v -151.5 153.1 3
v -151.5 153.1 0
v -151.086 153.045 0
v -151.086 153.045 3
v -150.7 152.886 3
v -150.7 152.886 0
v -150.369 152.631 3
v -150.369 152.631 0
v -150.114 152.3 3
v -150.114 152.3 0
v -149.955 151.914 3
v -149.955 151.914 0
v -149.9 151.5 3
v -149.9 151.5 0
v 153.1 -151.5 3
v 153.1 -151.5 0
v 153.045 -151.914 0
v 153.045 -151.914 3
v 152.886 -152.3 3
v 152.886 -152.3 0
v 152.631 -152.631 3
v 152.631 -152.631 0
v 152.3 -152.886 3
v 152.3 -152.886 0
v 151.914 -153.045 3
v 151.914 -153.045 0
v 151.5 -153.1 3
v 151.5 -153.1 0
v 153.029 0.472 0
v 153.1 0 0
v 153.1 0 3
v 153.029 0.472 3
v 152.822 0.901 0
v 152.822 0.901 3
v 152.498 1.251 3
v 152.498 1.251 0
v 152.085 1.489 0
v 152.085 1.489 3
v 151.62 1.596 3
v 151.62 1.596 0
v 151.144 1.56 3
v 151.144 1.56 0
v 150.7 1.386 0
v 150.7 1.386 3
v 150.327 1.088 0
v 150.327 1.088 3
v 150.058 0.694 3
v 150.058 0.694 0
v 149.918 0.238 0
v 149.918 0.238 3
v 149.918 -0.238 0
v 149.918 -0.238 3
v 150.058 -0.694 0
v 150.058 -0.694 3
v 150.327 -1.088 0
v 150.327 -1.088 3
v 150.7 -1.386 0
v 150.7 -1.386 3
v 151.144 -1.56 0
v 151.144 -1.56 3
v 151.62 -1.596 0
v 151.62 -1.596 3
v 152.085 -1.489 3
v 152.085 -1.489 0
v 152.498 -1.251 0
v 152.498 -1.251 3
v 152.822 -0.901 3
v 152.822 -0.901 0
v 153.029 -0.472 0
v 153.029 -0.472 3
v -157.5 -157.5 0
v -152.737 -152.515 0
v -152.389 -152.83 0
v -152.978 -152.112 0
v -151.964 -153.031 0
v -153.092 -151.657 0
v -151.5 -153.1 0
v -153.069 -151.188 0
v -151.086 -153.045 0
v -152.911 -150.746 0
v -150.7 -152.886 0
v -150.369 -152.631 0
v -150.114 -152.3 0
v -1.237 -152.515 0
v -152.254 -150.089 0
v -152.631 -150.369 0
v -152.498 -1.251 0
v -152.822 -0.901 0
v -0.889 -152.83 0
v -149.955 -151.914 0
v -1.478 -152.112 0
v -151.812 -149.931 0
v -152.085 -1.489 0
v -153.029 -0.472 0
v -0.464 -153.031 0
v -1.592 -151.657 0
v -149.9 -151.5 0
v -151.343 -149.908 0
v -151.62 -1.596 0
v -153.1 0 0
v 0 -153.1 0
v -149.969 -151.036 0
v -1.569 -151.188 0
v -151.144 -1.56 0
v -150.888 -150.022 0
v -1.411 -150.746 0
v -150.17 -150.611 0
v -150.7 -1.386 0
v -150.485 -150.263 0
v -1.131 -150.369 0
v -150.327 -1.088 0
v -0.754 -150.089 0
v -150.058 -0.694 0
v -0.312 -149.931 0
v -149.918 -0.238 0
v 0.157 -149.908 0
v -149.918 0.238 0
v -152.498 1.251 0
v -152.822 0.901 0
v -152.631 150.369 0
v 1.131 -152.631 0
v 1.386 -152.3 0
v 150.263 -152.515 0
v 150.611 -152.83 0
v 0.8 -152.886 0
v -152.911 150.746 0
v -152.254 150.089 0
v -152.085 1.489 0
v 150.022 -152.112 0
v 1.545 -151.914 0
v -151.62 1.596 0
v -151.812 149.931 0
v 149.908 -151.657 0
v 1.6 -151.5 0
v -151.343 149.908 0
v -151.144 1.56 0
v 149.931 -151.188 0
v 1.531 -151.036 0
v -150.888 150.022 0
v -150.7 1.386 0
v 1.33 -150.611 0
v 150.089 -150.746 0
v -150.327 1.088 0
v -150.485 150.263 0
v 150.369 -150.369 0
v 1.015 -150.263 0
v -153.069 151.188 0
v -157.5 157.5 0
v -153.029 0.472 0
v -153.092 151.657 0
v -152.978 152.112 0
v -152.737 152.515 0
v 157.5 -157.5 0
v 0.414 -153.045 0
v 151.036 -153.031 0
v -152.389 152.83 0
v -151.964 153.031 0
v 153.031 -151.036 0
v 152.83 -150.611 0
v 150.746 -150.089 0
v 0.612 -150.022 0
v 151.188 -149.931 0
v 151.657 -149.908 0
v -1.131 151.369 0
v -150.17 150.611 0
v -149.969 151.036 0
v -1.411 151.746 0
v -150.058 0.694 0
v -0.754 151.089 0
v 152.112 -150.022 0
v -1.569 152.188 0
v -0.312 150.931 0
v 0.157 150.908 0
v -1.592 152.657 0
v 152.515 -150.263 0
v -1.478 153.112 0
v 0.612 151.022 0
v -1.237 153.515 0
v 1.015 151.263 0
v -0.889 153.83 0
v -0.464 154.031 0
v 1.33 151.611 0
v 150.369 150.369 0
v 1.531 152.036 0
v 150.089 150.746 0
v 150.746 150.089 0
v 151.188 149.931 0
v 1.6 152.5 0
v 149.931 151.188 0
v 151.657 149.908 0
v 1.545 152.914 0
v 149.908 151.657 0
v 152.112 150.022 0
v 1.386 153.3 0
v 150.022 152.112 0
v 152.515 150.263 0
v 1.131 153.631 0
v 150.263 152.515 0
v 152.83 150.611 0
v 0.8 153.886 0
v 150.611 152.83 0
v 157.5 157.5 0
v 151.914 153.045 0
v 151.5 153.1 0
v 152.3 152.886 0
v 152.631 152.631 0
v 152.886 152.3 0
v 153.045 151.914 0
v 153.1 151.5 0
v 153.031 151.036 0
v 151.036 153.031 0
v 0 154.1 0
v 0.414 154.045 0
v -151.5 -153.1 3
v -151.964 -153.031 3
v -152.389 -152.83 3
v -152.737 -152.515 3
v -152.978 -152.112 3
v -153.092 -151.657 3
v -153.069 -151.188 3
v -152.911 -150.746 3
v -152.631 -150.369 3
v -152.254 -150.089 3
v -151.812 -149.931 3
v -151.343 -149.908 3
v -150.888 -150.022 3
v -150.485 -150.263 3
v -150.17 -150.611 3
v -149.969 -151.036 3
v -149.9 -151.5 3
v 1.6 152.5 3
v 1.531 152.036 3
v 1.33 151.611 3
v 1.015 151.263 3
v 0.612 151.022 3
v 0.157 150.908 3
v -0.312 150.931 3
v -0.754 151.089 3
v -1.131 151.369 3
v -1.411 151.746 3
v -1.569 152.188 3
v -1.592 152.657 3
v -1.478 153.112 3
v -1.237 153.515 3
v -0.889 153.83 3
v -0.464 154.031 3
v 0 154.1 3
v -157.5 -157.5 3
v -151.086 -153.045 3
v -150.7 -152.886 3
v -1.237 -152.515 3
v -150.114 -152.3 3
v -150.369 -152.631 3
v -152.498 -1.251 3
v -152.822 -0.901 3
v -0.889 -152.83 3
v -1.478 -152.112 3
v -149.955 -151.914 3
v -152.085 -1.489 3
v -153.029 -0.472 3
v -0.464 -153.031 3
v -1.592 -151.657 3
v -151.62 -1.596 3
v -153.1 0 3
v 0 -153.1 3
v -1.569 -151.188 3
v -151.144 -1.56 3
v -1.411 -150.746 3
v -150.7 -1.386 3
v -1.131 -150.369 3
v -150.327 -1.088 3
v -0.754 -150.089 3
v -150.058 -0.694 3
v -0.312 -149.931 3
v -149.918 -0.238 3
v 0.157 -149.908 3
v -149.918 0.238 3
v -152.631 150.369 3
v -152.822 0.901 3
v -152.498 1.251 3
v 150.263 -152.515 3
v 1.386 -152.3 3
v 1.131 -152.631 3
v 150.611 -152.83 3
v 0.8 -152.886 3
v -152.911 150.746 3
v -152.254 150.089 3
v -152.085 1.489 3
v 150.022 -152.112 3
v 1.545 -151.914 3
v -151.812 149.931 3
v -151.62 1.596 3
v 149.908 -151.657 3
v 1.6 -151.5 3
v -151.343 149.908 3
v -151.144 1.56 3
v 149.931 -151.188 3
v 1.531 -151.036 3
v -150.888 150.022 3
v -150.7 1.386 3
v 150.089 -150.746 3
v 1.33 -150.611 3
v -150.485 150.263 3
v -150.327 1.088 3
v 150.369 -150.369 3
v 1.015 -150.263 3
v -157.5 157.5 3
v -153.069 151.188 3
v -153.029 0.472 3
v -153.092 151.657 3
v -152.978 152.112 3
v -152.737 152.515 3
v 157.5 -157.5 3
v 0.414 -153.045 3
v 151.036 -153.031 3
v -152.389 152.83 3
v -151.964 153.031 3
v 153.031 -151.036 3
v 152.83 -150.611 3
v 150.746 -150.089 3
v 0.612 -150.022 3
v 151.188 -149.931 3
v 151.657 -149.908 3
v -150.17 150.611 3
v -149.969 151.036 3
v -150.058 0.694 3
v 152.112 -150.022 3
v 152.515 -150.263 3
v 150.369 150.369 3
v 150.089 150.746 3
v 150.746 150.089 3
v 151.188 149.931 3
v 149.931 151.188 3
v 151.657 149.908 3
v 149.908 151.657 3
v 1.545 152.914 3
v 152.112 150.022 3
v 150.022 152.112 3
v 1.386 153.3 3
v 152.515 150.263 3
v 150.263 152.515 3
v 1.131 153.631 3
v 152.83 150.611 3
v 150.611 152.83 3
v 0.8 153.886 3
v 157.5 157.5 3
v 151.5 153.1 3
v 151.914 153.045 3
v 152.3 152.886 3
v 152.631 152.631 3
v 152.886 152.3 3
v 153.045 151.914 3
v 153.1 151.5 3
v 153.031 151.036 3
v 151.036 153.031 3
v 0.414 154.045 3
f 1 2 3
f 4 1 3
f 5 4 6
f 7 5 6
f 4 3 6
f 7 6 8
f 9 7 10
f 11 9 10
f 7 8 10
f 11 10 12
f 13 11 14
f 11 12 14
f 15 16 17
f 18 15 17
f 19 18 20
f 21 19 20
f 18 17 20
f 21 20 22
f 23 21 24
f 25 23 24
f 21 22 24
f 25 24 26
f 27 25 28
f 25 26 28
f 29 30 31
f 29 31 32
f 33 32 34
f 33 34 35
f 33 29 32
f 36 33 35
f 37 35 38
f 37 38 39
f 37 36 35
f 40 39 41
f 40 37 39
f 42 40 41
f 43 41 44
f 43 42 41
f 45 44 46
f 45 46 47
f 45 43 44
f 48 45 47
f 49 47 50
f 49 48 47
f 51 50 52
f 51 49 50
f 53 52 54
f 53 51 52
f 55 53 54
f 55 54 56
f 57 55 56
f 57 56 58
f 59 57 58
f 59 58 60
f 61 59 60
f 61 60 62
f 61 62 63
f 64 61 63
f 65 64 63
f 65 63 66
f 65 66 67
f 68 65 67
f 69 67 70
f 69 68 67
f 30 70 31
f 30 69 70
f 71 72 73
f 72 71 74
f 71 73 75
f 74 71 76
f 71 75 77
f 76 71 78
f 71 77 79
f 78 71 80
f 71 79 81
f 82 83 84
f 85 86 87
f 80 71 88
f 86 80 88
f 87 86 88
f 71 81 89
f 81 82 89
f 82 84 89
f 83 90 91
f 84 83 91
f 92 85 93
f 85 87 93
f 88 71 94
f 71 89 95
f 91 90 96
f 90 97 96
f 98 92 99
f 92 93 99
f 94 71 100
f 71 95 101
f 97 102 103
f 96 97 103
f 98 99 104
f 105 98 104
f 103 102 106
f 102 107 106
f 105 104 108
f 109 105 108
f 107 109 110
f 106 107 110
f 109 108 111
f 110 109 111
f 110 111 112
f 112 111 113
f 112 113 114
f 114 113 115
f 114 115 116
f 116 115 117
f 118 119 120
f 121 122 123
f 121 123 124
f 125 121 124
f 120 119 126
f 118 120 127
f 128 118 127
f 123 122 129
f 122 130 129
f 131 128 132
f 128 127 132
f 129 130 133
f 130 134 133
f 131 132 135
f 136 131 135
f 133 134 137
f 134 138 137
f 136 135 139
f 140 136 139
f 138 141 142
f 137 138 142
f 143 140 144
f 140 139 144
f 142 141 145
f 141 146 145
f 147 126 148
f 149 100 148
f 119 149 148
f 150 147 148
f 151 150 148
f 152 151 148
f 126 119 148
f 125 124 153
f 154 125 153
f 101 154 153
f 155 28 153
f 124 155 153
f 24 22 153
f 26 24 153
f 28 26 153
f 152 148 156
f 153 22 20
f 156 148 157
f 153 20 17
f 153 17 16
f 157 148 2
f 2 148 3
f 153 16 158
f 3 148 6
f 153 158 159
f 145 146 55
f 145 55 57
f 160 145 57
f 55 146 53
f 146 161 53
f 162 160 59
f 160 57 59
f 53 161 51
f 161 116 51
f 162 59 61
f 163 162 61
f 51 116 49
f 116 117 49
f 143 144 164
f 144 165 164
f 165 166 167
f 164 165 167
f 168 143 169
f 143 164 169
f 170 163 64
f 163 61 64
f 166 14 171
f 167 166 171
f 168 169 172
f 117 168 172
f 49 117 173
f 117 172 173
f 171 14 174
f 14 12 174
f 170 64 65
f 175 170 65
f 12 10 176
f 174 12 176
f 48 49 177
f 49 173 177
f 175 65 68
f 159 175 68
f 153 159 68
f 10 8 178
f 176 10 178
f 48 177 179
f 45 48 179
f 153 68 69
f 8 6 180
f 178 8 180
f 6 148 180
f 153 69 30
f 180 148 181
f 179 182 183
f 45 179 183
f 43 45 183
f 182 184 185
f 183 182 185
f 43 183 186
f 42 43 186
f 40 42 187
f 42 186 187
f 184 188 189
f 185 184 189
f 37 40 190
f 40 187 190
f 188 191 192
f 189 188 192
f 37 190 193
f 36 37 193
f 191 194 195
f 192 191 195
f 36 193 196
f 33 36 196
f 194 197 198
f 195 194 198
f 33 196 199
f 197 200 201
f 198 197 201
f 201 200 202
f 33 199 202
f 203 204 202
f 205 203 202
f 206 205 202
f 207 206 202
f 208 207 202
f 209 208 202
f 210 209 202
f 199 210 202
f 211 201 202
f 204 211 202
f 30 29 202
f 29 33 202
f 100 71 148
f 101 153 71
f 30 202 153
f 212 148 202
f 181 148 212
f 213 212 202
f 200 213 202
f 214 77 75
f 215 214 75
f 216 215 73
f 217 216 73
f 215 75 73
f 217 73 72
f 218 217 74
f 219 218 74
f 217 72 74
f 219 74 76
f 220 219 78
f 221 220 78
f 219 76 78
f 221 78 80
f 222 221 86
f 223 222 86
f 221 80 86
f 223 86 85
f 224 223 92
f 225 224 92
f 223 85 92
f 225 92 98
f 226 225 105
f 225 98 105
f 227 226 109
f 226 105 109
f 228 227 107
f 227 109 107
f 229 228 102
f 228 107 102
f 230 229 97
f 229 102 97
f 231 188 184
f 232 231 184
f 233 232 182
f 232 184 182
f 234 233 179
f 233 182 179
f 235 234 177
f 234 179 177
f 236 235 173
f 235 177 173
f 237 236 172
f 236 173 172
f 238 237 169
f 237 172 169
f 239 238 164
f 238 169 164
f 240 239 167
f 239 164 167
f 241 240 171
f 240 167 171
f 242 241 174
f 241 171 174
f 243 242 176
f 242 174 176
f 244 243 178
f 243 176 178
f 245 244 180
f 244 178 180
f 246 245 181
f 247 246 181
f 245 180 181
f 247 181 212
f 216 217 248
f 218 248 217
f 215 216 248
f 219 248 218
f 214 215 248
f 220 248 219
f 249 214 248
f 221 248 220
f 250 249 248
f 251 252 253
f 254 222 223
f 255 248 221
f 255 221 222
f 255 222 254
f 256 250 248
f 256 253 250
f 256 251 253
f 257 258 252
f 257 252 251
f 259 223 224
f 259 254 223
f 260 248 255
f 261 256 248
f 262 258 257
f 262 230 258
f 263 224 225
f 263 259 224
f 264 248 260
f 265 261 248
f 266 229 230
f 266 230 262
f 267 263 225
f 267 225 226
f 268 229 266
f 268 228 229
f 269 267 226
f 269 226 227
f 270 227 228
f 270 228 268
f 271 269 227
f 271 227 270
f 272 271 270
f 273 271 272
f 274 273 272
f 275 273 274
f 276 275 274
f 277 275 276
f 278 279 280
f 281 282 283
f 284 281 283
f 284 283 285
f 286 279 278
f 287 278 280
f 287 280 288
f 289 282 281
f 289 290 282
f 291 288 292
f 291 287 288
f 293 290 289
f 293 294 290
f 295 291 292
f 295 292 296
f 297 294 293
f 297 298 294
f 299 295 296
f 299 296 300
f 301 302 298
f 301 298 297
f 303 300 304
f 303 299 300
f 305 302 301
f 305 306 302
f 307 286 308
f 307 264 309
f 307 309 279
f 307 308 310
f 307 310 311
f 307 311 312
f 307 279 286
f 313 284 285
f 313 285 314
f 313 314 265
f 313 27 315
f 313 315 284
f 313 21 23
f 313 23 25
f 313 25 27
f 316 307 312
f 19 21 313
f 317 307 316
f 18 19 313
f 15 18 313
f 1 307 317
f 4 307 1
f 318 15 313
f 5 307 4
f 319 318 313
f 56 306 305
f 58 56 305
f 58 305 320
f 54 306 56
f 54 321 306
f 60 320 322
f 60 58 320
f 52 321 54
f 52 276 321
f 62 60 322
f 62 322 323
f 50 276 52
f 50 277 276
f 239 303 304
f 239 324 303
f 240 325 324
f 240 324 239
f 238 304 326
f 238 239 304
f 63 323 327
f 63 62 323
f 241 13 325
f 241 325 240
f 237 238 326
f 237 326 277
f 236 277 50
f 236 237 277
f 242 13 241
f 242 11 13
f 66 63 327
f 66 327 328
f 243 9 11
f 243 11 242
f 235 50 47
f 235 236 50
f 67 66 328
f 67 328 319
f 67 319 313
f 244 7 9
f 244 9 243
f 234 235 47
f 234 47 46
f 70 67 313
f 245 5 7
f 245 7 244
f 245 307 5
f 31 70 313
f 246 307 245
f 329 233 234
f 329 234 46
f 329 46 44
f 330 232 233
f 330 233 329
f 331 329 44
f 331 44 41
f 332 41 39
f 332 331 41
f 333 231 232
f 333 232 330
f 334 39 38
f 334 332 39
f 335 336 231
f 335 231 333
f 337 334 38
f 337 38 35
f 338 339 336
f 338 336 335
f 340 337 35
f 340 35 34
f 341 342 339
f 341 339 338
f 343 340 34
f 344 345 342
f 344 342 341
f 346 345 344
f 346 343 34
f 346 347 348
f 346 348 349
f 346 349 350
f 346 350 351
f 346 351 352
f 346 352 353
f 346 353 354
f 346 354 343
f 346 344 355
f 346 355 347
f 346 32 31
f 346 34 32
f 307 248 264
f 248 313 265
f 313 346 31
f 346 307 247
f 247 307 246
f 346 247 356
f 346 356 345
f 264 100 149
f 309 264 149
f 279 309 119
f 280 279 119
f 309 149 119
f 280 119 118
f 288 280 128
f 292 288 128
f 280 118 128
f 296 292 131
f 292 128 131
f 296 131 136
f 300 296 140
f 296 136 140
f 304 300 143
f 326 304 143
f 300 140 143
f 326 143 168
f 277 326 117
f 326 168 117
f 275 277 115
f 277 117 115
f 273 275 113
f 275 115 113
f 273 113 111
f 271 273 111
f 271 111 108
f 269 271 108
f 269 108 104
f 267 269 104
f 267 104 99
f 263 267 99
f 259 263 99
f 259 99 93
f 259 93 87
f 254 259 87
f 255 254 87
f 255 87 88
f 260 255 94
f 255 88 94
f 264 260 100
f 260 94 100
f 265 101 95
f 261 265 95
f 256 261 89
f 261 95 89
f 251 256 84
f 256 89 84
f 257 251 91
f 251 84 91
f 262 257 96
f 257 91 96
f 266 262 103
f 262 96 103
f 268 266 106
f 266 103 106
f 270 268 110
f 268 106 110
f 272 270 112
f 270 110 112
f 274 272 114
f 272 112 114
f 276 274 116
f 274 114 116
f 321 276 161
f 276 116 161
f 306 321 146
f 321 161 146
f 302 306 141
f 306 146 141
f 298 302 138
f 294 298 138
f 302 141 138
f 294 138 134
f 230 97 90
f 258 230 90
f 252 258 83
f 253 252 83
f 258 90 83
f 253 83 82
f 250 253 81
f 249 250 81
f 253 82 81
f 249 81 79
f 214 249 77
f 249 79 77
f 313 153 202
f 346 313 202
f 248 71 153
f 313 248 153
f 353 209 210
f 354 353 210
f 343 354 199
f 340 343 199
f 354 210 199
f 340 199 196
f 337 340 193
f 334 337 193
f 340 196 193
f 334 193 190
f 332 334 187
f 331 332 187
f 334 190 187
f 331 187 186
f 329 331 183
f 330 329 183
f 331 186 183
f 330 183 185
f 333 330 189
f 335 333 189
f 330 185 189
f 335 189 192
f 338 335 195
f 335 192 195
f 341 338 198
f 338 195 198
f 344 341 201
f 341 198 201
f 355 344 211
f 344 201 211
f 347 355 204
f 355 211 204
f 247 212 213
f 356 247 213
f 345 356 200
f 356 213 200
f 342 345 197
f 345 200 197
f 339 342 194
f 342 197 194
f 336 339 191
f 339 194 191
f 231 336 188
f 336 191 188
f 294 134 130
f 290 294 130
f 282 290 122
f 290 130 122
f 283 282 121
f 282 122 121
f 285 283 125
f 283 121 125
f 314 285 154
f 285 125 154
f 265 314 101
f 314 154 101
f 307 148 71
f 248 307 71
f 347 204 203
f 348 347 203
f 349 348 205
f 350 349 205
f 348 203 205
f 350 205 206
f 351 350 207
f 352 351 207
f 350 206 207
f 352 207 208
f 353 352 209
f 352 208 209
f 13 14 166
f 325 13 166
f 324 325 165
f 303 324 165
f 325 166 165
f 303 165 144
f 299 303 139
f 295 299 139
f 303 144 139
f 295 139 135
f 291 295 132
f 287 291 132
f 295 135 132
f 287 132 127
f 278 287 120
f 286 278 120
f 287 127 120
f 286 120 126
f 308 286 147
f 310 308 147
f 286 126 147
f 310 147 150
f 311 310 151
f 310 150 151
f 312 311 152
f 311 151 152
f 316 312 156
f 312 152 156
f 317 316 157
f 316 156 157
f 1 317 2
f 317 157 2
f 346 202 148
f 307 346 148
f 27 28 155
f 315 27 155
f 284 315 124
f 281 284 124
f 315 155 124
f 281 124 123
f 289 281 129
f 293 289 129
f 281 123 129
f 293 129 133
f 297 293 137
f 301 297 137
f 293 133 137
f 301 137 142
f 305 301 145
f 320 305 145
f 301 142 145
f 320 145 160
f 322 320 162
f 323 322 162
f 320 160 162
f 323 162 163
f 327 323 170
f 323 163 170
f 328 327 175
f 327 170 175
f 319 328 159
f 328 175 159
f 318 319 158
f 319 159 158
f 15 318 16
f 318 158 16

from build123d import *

# Parameters (mm, degrees)
F0_R     = 1.6
F1_DEPTH = 3


with BuildPart() as f1:
    # F0 (on Top) → F1 (new body)
    with BuildSketch(Plane.XY):
        Polygon((-151.5, 157.5), (-157.5, 157.5), (-157.5, 0), (-157.5, -157.5), (-151.5, -157.5), (0, -157.5), (151.5, -157.5), (157.5, -157.5), (157.5, 0), (157.5, 157.5), (151.5, 157.5), (0, 157.5), align=None)
        with BuildLine():
            ThreePointArc((-149.9, -151.5), (-150.368629, -152.631371), (-151.5, -153.1))
            ThreePointArc((-151.5, -153.1), (-152.631371, -150.368629), (-149.9, -151.5))
        make_face(mode=Mode.SUBTRACT)
        with BuildLine():
            ThreePointArc((1.6, -151.5), (1.131371, -152.631371), (0, -153.1))
            ThreePointArc((0, -153.1), (-1.131371, -150.368629), (1.6, -151.5))
        make_face(mode=Mode.SUBTRACT)
        with BuildLine():
            ThreePointArc((153.1, -151.5), (152.631371, -152.631371), (151.5, -153.1))
            ThreePointArc((151.5, -153.1), (150.368629, -150.368629), (153.1, -151.5))
        make_face(mode=Mode.SUBTRACT)
        with BuildLine():
            ThreePointArc((-149.9, 0), (-151.5, -1.6), (-153.1, 0))
            ThreePointArc((-153.1, 0), (-151.5, 1.6), (-149.9, 0))
        make_face(mode=Mode.SUBTRACT)
        with BuildLine():
            ThreePointArc((-149.9, 151.5), (-152.631371, 150.368629), (-151.5, 153.1))
            ThreePointArc((-151.5, 153.1), (-150.368629, 152.631371), (-149.9, 151.5))
        make_face(mode=Mode.SUBTRACT)
        with Locations((151.5, 0)):
            Circle(F0_R, mode=Mode.SUBTRACT)
        with BuildLine():
            ThreePointArc((1.6, 152.5), (-1.131371, 151.368629), (0, 154.1))
            ThreePointArc((0, 154.1), (1.131371, 153.631371), (1.6, 152.5))
        make_face(mode=Mode.SUBTRACT)
        with BuildLine():
            ThreePointArc((153.1, 151.5), (150.368629, 150.368629), (151.5, 153.1))
            ThreePointArc((151.5, 153.1), (152.631371, 152.631371), (153.1, 151.5))
        make_face(mode=Mode.SUBTRACT)
    extrude(amount=F1_DEPTH)


solid = f1.part
